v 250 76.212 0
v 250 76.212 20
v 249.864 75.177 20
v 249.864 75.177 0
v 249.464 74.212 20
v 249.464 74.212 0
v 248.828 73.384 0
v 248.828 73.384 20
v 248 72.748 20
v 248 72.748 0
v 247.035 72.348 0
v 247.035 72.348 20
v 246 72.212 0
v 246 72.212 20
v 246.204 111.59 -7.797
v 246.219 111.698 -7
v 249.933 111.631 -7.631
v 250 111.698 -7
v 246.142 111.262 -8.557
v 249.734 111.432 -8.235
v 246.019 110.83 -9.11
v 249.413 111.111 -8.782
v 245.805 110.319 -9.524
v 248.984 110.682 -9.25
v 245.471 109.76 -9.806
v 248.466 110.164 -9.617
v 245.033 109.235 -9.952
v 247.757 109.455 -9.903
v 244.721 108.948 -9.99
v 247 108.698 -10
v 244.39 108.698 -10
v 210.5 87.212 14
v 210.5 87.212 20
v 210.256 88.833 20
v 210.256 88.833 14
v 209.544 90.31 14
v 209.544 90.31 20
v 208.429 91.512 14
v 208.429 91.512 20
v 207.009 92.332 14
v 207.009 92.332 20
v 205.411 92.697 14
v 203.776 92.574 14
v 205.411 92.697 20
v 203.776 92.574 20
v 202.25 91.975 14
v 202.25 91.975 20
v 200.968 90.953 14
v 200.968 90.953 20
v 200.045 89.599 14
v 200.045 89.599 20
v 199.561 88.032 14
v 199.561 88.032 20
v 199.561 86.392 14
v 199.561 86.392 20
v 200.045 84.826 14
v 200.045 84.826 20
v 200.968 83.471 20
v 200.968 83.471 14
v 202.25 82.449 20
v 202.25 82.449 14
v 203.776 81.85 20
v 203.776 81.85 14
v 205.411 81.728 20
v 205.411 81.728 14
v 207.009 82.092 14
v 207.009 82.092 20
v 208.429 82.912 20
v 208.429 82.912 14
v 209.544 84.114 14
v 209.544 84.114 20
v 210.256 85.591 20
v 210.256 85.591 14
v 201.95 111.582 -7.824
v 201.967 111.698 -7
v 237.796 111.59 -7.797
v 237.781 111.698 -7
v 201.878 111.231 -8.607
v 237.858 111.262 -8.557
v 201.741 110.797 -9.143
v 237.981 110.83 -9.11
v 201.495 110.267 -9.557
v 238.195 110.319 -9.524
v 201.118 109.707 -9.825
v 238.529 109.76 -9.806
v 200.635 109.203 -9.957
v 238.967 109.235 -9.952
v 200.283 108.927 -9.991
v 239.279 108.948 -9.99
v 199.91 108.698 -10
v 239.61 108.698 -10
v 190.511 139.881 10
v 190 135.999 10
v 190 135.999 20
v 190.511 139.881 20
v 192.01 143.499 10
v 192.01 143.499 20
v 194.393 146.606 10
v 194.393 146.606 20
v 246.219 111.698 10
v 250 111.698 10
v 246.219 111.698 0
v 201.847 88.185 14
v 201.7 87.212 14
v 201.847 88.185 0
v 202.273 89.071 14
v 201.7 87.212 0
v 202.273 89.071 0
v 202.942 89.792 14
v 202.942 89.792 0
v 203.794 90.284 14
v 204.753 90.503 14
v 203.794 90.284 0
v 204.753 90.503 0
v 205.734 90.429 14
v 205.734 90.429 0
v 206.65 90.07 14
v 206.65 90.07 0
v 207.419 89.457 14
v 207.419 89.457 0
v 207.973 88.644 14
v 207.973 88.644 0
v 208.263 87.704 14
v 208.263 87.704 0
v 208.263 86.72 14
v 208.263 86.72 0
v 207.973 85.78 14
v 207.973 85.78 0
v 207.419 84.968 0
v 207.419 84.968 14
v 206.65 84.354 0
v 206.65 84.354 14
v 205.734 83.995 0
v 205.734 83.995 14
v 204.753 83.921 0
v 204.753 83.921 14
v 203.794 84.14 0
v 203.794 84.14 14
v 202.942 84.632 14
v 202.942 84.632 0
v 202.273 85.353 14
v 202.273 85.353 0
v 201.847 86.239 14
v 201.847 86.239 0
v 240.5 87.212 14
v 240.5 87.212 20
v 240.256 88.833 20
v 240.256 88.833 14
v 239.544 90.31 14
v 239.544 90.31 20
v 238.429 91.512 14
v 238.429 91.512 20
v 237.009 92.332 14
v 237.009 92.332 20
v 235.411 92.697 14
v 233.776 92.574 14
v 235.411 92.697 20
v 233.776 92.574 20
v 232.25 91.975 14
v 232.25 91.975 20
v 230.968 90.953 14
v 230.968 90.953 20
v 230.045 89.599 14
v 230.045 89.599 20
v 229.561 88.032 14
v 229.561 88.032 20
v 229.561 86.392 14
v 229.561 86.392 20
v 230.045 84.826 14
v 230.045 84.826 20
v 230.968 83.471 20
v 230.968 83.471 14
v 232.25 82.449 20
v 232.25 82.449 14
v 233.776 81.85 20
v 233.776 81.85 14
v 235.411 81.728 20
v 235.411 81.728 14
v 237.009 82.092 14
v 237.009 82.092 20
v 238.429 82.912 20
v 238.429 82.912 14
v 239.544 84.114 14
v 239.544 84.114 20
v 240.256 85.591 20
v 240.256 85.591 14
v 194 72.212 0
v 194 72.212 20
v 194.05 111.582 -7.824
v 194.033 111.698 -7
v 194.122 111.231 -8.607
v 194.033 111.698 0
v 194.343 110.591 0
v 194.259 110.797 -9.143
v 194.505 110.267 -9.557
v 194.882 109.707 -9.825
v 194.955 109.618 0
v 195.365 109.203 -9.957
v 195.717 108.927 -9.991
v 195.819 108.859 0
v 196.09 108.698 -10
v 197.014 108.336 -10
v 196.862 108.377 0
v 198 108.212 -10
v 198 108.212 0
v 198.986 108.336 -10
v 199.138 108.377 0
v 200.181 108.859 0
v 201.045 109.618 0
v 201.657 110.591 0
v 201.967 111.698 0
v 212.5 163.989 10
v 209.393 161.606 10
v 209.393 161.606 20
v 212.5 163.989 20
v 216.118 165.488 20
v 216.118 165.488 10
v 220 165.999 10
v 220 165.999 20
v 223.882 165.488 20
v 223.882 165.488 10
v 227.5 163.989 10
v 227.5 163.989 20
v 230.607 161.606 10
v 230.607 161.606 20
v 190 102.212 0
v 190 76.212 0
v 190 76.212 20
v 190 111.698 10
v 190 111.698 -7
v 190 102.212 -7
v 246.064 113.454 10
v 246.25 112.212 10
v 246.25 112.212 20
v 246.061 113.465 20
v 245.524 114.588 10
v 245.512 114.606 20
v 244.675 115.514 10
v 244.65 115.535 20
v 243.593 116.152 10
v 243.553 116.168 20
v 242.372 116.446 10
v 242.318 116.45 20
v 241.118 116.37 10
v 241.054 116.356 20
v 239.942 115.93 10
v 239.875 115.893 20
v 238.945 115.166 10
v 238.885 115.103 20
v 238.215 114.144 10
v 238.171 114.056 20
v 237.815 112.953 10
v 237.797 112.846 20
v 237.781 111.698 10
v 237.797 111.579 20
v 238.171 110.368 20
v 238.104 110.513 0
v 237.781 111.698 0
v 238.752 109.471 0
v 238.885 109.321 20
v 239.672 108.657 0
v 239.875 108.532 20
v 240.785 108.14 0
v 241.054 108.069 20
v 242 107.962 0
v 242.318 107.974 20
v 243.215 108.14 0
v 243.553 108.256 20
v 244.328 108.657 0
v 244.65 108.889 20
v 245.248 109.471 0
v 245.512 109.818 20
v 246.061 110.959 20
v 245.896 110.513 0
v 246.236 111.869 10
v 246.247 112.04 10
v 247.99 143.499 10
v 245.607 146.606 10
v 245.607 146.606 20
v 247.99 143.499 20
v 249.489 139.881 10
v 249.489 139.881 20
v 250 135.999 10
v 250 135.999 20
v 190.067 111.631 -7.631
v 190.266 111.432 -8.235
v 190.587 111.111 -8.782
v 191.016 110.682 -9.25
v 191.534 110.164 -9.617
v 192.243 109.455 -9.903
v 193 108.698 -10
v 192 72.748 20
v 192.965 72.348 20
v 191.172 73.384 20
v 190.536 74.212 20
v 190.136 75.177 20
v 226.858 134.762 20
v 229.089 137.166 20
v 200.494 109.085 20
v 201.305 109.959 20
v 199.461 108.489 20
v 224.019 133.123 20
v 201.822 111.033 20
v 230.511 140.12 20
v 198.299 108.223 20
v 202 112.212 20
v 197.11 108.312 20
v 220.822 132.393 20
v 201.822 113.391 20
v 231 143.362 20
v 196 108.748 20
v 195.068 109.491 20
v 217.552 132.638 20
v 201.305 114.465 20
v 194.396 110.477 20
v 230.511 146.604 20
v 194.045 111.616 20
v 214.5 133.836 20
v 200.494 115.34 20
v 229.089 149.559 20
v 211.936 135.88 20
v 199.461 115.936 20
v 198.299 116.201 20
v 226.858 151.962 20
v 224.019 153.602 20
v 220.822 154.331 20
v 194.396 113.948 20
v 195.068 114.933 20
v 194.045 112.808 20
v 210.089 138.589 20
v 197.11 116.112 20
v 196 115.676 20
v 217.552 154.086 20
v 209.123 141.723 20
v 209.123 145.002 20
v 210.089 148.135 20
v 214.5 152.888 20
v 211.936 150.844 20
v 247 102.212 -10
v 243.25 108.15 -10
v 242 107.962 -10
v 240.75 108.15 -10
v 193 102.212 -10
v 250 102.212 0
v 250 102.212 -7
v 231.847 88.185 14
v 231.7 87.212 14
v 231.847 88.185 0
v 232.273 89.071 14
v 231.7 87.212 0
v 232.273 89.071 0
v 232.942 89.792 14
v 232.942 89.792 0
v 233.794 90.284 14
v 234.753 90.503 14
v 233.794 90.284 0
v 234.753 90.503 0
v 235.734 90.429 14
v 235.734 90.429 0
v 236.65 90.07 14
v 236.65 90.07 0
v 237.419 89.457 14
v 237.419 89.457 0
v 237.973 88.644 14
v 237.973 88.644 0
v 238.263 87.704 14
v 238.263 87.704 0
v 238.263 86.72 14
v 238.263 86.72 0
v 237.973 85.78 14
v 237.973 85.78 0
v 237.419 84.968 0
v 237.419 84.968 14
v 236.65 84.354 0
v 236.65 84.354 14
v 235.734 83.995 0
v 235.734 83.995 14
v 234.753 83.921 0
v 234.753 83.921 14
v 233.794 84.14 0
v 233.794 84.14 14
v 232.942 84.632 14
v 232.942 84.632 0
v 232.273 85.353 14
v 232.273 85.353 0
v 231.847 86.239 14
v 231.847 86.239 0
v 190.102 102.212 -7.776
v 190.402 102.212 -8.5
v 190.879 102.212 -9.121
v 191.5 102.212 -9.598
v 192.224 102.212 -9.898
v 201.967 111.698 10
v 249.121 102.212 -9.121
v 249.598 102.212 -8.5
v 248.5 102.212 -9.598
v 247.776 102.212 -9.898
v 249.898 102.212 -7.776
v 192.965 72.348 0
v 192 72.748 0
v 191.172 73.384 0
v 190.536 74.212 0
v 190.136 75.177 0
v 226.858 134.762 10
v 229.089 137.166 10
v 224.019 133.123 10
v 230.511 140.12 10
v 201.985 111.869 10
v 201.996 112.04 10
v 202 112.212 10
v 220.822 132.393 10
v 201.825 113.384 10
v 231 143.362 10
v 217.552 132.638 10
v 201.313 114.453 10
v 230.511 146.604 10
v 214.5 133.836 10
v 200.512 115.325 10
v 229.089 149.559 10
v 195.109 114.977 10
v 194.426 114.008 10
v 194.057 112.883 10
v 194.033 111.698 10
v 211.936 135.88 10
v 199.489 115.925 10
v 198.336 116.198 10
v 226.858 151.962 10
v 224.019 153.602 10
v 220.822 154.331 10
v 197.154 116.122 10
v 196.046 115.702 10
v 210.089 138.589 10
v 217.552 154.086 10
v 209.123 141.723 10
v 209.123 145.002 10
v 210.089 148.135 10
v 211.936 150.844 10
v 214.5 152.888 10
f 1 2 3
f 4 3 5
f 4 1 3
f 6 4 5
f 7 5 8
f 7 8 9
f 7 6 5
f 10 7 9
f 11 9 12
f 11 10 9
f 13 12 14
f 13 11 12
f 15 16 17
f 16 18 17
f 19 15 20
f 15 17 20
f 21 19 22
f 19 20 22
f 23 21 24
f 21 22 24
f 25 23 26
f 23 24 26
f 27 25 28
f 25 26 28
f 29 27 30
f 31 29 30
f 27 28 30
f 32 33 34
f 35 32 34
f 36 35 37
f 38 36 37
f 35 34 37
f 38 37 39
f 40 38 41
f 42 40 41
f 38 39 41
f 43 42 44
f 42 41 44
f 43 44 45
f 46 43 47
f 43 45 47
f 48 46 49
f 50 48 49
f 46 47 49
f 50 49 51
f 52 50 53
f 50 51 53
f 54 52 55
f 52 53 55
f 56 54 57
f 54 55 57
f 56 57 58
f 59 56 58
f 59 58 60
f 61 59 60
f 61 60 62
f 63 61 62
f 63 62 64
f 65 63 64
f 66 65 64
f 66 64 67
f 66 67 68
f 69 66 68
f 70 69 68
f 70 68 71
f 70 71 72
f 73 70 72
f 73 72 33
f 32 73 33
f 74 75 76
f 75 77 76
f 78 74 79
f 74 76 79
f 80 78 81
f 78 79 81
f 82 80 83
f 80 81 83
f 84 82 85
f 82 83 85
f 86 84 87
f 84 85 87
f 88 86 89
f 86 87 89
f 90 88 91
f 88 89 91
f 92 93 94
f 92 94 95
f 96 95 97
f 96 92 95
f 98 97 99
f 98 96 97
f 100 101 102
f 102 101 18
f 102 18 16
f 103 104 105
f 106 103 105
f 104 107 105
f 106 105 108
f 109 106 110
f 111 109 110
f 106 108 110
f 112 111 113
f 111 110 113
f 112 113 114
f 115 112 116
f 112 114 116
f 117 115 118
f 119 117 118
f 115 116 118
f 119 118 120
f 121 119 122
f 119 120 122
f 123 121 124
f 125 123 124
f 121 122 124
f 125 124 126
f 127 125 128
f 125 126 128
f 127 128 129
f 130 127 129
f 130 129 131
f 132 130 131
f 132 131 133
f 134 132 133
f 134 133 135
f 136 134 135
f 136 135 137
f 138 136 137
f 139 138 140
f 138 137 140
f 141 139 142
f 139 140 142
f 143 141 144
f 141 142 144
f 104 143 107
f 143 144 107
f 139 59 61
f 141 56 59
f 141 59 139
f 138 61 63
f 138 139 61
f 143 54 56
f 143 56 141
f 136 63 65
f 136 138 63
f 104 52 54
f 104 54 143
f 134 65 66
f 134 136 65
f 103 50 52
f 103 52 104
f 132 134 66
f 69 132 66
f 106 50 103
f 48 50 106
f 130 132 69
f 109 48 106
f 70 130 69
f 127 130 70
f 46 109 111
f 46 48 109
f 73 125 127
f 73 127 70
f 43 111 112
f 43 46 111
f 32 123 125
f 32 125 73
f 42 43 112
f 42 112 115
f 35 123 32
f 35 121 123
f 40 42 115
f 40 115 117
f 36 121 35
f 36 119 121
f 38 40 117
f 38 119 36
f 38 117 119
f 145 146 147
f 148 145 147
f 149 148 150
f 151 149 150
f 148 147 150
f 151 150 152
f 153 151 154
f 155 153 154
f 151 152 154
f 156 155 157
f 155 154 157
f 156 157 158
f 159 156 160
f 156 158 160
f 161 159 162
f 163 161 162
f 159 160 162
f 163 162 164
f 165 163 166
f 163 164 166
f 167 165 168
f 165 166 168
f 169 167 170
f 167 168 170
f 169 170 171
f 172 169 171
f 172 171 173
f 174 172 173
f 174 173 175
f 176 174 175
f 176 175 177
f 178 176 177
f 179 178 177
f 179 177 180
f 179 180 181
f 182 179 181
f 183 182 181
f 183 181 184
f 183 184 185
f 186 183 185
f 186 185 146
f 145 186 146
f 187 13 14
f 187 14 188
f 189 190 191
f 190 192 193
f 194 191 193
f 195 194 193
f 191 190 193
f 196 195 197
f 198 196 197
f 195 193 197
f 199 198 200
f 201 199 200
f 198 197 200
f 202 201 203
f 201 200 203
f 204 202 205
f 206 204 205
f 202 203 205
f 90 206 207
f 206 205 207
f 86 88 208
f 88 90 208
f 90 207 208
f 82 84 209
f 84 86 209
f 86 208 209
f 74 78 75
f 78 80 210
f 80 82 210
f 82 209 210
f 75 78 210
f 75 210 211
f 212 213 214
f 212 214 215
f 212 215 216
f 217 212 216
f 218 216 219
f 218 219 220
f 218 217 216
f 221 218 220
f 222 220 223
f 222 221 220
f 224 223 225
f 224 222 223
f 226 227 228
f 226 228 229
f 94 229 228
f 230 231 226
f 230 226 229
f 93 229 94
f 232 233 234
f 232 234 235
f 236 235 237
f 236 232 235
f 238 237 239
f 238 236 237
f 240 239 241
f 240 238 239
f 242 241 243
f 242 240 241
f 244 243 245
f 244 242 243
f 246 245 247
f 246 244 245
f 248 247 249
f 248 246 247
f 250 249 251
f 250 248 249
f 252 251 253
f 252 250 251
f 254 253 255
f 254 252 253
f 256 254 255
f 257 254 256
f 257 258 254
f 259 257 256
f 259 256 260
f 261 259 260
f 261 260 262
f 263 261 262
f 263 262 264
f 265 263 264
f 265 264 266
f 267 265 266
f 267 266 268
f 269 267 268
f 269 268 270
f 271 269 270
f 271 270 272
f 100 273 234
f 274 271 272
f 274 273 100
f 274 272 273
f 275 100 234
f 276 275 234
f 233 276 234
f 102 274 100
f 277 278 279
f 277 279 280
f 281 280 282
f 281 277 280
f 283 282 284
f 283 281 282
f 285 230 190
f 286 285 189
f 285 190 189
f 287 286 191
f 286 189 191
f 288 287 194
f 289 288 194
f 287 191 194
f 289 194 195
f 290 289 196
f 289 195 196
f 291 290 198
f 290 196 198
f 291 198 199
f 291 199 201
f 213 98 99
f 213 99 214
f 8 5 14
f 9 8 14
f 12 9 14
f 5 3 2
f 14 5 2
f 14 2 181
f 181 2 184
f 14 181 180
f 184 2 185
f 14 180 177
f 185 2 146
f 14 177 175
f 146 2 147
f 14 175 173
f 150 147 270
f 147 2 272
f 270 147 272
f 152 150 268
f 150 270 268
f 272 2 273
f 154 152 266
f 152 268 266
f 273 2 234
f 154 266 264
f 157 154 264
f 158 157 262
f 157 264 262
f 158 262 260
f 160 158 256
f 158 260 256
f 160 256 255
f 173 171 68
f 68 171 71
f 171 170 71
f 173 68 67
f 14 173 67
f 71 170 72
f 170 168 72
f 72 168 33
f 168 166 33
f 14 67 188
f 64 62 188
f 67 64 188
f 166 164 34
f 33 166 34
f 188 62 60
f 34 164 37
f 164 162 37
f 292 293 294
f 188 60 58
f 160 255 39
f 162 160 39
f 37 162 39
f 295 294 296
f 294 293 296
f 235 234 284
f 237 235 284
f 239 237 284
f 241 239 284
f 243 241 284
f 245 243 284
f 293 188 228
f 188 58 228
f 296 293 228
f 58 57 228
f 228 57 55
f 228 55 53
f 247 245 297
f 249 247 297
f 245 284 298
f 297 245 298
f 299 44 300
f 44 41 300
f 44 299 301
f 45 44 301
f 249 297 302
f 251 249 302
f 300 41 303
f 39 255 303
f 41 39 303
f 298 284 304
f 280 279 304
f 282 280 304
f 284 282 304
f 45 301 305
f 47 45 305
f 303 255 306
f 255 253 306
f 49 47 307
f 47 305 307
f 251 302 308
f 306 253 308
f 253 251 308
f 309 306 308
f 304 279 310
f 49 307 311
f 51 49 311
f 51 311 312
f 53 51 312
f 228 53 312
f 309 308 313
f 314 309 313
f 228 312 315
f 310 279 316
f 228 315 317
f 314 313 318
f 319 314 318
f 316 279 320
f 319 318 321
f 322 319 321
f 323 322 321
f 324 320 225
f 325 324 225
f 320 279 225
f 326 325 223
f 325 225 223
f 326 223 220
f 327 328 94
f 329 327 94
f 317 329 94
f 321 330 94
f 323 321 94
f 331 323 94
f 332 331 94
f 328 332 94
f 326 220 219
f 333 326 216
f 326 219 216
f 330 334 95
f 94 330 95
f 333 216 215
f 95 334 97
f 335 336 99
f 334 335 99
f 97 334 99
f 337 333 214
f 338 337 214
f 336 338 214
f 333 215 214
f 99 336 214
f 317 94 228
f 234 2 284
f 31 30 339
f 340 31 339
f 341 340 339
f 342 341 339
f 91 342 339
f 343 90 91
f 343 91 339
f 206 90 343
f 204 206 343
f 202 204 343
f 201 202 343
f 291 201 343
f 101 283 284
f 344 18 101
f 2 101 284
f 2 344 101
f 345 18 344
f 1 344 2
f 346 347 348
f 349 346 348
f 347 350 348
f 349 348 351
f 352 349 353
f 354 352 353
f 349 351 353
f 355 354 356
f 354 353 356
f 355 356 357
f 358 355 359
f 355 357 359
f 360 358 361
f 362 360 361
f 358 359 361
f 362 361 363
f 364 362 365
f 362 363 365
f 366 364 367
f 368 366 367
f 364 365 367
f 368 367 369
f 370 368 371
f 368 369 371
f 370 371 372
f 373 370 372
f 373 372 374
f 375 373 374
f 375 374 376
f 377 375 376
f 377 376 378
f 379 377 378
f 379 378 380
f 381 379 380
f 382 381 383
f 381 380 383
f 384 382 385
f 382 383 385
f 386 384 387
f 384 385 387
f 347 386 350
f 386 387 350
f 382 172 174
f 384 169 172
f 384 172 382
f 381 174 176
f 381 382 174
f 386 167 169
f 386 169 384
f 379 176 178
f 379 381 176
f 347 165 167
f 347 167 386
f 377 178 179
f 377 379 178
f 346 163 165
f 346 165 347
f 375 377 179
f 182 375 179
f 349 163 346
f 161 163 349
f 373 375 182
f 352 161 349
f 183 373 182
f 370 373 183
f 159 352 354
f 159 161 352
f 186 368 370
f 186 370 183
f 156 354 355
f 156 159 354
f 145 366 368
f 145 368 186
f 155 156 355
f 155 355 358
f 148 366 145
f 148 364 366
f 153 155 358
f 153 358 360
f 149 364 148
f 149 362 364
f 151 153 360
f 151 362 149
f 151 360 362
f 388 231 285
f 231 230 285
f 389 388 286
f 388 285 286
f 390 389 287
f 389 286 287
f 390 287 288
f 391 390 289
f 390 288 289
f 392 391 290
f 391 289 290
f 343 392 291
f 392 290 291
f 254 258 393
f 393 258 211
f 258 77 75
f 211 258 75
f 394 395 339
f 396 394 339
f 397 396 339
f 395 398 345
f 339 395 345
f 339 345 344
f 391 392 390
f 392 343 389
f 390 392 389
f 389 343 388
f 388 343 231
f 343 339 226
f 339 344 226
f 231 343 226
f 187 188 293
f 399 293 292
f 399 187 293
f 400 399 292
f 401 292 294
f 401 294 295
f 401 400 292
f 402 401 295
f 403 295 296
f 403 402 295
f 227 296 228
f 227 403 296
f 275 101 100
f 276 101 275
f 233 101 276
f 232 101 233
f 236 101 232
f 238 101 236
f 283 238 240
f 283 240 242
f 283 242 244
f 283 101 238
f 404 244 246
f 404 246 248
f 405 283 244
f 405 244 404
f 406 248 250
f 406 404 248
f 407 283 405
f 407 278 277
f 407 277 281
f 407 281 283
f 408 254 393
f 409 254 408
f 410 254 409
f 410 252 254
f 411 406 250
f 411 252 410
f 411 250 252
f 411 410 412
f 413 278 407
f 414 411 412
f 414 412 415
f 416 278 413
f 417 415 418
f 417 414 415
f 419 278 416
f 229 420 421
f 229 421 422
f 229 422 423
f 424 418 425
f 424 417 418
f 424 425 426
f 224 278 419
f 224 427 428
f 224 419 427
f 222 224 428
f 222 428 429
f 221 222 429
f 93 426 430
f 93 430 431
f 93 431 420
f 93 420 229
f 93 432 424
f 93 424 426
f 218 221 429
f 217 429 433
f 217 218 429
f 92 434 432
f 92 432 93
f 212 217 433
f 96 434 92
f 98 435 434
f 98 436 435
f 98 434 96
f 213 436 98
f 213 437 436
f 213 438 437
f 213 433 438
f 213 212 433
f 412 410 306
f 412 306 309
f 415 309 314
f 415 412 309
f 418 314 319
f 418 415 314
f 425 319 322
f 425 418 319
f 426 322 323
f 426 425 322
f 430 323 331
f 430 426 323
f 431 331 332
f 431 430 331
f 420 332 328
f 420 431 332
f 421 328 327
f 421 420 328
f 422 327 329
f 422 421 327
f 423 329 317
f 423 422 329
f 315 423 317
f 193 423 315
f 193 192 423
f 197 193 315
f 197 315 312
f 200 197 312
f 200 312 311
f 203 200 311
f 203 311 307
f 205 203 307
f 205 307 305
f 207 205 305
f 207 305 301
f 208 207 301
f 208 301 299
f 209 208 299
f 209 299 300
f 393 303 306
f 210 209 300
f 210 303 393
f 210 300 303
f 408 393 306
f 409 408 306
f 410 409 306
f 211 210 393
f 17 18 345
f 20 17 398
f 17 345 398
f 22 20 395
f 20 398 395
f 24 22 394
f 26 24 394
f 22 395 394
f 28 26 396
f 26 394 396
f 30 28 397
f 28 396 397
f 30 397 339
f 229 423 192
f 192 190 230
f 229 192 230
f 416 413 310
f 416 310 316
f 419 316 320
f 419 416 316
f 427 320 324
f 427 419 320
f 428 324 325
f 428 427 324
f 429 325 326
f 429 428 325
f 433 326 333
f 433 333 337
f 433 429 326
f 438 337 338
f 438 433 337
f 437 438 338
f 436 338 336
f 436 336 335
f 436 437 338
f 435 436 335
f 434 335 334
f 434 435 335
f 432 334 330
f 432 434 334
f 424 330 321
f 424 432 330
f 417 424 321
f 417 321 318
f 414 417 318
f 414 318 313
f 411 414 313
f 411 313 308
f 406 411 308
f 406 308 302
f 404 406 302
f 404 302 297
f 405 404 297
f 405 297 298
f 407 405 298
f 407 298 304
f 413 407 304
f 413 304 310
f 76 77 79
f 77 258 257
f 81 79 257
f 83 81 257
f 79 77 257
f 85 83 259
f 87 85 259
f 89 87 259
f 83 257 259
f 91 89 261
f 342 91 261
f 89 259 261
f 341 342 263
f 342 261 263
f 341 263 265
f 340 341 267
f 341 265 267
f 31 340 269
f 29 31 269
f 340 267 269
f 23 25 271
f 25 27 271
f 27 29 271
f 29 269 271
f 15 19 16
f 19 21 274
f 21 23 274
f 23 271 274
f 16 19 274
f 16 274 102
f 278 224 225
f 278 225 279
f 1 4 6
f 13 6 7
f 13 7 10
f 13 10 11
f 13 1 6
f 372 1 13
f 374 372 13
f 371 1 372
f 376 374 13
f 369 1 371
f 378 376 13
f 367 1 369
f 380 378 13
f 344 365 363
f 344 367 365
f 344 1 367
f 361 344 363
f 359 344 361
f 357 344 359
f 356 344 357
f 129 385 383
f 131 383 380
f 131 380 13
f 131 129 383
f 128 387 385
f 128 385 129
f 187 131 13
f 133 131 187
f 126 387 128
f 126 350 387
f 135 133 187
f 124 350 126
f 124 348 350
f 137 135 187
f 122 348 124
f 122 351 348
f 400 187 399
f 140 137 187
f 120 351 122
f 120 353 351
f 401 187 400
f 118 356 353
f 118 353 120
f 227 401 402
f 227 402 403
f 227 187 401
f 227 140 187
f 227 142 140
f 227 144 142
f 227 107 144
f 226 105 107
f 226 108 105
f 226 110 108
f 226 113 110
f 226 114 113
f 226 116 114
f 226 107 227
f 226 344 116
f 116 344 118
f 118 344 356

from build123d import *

# Parameters (mm, degrees)
ESBO_O2_R                         = 4
ESBO_O2_R_2                       = 4.25
ESBO_O2_R_3                       = 11
RESSALTO_EXTRUS_O1_DEPTH          = 20
RESSALTO_EXTRUS_O2_DEPTH          = 10
FILETE1_R                         = 3
CORTE_EXTRUS_O1_DEPTH             = 10
REBAIXO_PARA_SHCS_M61_D           = 6.6
REBAIXO_PARA_SHCS_M61_CBORE_D     = 11
REBAIXO_PARA_SHCS_M61_CBORE_DEPTH = 6


with BuildPart() as part:
    # Esboço2 → Ressalto-extrusão1 (new body)
    with BuildSketch(Plane.XY):
        with BuildLine():
            Line((250, 102.212171493), (250, 76.212189341))
            ThreePointArc((250, 76.212189341), (248.828427125, 73.383762216), (246, 72.212189341))
            Line((246, 72.212189341), (194, 72.212189341))
            ThreePointArc((194, 72.212189341), (191.171572875, 73.383762216), (190, 76.212189341))
            Line((190, 76.212189341), (190, 102.212171493))
            Line((190, 102.212171493), (190, 135.998985905))
            ThreePointArc((190, 135.998985905), (191.141807012, 141.73923739), (194.393398282, 146.605587623))
            Line((194.393398282, 146.605587623), (209.393398282, 161.605587623))
            ThreePointArc((209.393398282, 161.605587623), (220, 165.998985905), (230.606601718, 161.605587623))
            Line((230.606601718, 161.605587623), (245.606601718, 146.605587623))
            ThreePointArc((245.606601718, 146.605587623), (248.858192988, 141.73923739), (250, 135.998985905))
            Line((250, 135.998985905), (250, 102.212171493))
        make_face()
        with Locations((198, 112.212189341)):
            Circle(ESBO_O2_R, mode=Mode.SUBTRACT)
        with Locations((242, 112.212189341)):
            Circle(ESBO_O2_R_2, mode=Mode.SUBTRACT)
        with Locations((220, 143.362189341)):
            Circle(ESBO_O2_R_3, mode=Mode.SUBTRACT)
    extrude(amount=RESSALTO_EXTRUS_O1_DEPTH)

    # Esboço3 → Ressalto-extrusão2 (add)
    with BuildSketch(Plane(origin=(0, 0, 0), x_dir=(-1, 0, 0), z_dir=(0, 0, -1))):
        with BuildLine():
            Line((-250, 111.697903626), (-250, 102.212171493))
            Line((-250, 102.212171493), (-190, 102.212171493))
            Line((-190, 102.212171493), (-190, 111.697903626))
            Line((-190, 111.697903626), (-194.033198996, 111.697903626))
            ThreePointArc((-194.033198996, 111.697903626), (-198, 108.212189341), (-201.966801004, 111.697903626))
            Line((-201.966801004, 111.697903626), (-237.781231198, 111.697903626))
            ThreePointArc((-237.781231198, 111.697903626), (-242, 107.962189341), (-246.218768802, 111.697903626))
            Line((-246.218768802, 111.697903626), (-250, 111.697903626))
        make_face()
    extrude(amount=RESSALTO_EXTRUS_O2_DEPTH)

    # Filete1
    filete1_edges = [part.edges().sort_by_distance(p)[0] for p in [
        (219.874016101, 111.697903626, -10),
        (248.109384401, 111.697903626, -10),
        (250, 106.955037559, -10),
        (190, 106.955037559, -10),
        (192.016599498, 111.697903626, -10),
    ]]
    fillet(filete1_edges, radius=FILETE1_R)

    # Esboço4 → Corte-extrusão1 (cut)
    with BuildSketch(Plane(origin=(0, 0, 0), x_dir=(-1, 0, 0), z_dir=(0, 0, -1))):
        with BuildLine():
            Line((-194.033198996, 111.697903626), (-190, 111.697903626))
            Line((-190, 111.697903626), (-190, 135.998985905))
            ThreePointArc((-190, 135.998985905), (-191.141807012, 141.73923739), (-194.393398282, 146.605587623))
            Line((-194.393398282, 146.605587623), (-209.393398282, 161.605587623))
            ThreePointArc((-209.393398282, 161.605587623), (-220, 165.998985905), (-230.606601718, 161.605587623))
            Line((-230.606601718, 161.605587623), (-245.606601718, 146.605587623))
            ThreePointArc((-245.606601718, 146.605587623), (-248.858192988, 141.73923739), (-250, 135.998985905))
            Line((-250, 135.998985905), (-250, 111.697903626))
            Line((-250, 111.697903626), (-246.218768802, 111.697903626))
            ThreePointArc((-246.218768802, 111.697903626), (-242, 116.462189341), (-237.781231198, 111.697903626))
            Line((-237.781231198, 111.697903626), (-201.966801004, 111.697903626))
            ThreePointArc((-201.966801004, 111.697903626), (-198, 116.212189341), (-194.033198996, 111.697903626))
        make_face()
    extrude(amount=-CORTE_EXTRUS_O1_DEPTH, mode=Mode.SUBTRACT)

    # Rebaixo para SHCS M61 (through all)
    with Locations(Plane.XY.offset(20)):
        with Locations((235, 87.212189341), (205, 87.212189341)):
            CounterBoreHole(REBAIXO_PARA_SHCS_M61_D / 2, REBAIXO_PARA_SHCS_M61_CBORE_D / 2, REBAIXO_PARA_SHCS_M61_CBORE_DEPTH)


solid = part.part
